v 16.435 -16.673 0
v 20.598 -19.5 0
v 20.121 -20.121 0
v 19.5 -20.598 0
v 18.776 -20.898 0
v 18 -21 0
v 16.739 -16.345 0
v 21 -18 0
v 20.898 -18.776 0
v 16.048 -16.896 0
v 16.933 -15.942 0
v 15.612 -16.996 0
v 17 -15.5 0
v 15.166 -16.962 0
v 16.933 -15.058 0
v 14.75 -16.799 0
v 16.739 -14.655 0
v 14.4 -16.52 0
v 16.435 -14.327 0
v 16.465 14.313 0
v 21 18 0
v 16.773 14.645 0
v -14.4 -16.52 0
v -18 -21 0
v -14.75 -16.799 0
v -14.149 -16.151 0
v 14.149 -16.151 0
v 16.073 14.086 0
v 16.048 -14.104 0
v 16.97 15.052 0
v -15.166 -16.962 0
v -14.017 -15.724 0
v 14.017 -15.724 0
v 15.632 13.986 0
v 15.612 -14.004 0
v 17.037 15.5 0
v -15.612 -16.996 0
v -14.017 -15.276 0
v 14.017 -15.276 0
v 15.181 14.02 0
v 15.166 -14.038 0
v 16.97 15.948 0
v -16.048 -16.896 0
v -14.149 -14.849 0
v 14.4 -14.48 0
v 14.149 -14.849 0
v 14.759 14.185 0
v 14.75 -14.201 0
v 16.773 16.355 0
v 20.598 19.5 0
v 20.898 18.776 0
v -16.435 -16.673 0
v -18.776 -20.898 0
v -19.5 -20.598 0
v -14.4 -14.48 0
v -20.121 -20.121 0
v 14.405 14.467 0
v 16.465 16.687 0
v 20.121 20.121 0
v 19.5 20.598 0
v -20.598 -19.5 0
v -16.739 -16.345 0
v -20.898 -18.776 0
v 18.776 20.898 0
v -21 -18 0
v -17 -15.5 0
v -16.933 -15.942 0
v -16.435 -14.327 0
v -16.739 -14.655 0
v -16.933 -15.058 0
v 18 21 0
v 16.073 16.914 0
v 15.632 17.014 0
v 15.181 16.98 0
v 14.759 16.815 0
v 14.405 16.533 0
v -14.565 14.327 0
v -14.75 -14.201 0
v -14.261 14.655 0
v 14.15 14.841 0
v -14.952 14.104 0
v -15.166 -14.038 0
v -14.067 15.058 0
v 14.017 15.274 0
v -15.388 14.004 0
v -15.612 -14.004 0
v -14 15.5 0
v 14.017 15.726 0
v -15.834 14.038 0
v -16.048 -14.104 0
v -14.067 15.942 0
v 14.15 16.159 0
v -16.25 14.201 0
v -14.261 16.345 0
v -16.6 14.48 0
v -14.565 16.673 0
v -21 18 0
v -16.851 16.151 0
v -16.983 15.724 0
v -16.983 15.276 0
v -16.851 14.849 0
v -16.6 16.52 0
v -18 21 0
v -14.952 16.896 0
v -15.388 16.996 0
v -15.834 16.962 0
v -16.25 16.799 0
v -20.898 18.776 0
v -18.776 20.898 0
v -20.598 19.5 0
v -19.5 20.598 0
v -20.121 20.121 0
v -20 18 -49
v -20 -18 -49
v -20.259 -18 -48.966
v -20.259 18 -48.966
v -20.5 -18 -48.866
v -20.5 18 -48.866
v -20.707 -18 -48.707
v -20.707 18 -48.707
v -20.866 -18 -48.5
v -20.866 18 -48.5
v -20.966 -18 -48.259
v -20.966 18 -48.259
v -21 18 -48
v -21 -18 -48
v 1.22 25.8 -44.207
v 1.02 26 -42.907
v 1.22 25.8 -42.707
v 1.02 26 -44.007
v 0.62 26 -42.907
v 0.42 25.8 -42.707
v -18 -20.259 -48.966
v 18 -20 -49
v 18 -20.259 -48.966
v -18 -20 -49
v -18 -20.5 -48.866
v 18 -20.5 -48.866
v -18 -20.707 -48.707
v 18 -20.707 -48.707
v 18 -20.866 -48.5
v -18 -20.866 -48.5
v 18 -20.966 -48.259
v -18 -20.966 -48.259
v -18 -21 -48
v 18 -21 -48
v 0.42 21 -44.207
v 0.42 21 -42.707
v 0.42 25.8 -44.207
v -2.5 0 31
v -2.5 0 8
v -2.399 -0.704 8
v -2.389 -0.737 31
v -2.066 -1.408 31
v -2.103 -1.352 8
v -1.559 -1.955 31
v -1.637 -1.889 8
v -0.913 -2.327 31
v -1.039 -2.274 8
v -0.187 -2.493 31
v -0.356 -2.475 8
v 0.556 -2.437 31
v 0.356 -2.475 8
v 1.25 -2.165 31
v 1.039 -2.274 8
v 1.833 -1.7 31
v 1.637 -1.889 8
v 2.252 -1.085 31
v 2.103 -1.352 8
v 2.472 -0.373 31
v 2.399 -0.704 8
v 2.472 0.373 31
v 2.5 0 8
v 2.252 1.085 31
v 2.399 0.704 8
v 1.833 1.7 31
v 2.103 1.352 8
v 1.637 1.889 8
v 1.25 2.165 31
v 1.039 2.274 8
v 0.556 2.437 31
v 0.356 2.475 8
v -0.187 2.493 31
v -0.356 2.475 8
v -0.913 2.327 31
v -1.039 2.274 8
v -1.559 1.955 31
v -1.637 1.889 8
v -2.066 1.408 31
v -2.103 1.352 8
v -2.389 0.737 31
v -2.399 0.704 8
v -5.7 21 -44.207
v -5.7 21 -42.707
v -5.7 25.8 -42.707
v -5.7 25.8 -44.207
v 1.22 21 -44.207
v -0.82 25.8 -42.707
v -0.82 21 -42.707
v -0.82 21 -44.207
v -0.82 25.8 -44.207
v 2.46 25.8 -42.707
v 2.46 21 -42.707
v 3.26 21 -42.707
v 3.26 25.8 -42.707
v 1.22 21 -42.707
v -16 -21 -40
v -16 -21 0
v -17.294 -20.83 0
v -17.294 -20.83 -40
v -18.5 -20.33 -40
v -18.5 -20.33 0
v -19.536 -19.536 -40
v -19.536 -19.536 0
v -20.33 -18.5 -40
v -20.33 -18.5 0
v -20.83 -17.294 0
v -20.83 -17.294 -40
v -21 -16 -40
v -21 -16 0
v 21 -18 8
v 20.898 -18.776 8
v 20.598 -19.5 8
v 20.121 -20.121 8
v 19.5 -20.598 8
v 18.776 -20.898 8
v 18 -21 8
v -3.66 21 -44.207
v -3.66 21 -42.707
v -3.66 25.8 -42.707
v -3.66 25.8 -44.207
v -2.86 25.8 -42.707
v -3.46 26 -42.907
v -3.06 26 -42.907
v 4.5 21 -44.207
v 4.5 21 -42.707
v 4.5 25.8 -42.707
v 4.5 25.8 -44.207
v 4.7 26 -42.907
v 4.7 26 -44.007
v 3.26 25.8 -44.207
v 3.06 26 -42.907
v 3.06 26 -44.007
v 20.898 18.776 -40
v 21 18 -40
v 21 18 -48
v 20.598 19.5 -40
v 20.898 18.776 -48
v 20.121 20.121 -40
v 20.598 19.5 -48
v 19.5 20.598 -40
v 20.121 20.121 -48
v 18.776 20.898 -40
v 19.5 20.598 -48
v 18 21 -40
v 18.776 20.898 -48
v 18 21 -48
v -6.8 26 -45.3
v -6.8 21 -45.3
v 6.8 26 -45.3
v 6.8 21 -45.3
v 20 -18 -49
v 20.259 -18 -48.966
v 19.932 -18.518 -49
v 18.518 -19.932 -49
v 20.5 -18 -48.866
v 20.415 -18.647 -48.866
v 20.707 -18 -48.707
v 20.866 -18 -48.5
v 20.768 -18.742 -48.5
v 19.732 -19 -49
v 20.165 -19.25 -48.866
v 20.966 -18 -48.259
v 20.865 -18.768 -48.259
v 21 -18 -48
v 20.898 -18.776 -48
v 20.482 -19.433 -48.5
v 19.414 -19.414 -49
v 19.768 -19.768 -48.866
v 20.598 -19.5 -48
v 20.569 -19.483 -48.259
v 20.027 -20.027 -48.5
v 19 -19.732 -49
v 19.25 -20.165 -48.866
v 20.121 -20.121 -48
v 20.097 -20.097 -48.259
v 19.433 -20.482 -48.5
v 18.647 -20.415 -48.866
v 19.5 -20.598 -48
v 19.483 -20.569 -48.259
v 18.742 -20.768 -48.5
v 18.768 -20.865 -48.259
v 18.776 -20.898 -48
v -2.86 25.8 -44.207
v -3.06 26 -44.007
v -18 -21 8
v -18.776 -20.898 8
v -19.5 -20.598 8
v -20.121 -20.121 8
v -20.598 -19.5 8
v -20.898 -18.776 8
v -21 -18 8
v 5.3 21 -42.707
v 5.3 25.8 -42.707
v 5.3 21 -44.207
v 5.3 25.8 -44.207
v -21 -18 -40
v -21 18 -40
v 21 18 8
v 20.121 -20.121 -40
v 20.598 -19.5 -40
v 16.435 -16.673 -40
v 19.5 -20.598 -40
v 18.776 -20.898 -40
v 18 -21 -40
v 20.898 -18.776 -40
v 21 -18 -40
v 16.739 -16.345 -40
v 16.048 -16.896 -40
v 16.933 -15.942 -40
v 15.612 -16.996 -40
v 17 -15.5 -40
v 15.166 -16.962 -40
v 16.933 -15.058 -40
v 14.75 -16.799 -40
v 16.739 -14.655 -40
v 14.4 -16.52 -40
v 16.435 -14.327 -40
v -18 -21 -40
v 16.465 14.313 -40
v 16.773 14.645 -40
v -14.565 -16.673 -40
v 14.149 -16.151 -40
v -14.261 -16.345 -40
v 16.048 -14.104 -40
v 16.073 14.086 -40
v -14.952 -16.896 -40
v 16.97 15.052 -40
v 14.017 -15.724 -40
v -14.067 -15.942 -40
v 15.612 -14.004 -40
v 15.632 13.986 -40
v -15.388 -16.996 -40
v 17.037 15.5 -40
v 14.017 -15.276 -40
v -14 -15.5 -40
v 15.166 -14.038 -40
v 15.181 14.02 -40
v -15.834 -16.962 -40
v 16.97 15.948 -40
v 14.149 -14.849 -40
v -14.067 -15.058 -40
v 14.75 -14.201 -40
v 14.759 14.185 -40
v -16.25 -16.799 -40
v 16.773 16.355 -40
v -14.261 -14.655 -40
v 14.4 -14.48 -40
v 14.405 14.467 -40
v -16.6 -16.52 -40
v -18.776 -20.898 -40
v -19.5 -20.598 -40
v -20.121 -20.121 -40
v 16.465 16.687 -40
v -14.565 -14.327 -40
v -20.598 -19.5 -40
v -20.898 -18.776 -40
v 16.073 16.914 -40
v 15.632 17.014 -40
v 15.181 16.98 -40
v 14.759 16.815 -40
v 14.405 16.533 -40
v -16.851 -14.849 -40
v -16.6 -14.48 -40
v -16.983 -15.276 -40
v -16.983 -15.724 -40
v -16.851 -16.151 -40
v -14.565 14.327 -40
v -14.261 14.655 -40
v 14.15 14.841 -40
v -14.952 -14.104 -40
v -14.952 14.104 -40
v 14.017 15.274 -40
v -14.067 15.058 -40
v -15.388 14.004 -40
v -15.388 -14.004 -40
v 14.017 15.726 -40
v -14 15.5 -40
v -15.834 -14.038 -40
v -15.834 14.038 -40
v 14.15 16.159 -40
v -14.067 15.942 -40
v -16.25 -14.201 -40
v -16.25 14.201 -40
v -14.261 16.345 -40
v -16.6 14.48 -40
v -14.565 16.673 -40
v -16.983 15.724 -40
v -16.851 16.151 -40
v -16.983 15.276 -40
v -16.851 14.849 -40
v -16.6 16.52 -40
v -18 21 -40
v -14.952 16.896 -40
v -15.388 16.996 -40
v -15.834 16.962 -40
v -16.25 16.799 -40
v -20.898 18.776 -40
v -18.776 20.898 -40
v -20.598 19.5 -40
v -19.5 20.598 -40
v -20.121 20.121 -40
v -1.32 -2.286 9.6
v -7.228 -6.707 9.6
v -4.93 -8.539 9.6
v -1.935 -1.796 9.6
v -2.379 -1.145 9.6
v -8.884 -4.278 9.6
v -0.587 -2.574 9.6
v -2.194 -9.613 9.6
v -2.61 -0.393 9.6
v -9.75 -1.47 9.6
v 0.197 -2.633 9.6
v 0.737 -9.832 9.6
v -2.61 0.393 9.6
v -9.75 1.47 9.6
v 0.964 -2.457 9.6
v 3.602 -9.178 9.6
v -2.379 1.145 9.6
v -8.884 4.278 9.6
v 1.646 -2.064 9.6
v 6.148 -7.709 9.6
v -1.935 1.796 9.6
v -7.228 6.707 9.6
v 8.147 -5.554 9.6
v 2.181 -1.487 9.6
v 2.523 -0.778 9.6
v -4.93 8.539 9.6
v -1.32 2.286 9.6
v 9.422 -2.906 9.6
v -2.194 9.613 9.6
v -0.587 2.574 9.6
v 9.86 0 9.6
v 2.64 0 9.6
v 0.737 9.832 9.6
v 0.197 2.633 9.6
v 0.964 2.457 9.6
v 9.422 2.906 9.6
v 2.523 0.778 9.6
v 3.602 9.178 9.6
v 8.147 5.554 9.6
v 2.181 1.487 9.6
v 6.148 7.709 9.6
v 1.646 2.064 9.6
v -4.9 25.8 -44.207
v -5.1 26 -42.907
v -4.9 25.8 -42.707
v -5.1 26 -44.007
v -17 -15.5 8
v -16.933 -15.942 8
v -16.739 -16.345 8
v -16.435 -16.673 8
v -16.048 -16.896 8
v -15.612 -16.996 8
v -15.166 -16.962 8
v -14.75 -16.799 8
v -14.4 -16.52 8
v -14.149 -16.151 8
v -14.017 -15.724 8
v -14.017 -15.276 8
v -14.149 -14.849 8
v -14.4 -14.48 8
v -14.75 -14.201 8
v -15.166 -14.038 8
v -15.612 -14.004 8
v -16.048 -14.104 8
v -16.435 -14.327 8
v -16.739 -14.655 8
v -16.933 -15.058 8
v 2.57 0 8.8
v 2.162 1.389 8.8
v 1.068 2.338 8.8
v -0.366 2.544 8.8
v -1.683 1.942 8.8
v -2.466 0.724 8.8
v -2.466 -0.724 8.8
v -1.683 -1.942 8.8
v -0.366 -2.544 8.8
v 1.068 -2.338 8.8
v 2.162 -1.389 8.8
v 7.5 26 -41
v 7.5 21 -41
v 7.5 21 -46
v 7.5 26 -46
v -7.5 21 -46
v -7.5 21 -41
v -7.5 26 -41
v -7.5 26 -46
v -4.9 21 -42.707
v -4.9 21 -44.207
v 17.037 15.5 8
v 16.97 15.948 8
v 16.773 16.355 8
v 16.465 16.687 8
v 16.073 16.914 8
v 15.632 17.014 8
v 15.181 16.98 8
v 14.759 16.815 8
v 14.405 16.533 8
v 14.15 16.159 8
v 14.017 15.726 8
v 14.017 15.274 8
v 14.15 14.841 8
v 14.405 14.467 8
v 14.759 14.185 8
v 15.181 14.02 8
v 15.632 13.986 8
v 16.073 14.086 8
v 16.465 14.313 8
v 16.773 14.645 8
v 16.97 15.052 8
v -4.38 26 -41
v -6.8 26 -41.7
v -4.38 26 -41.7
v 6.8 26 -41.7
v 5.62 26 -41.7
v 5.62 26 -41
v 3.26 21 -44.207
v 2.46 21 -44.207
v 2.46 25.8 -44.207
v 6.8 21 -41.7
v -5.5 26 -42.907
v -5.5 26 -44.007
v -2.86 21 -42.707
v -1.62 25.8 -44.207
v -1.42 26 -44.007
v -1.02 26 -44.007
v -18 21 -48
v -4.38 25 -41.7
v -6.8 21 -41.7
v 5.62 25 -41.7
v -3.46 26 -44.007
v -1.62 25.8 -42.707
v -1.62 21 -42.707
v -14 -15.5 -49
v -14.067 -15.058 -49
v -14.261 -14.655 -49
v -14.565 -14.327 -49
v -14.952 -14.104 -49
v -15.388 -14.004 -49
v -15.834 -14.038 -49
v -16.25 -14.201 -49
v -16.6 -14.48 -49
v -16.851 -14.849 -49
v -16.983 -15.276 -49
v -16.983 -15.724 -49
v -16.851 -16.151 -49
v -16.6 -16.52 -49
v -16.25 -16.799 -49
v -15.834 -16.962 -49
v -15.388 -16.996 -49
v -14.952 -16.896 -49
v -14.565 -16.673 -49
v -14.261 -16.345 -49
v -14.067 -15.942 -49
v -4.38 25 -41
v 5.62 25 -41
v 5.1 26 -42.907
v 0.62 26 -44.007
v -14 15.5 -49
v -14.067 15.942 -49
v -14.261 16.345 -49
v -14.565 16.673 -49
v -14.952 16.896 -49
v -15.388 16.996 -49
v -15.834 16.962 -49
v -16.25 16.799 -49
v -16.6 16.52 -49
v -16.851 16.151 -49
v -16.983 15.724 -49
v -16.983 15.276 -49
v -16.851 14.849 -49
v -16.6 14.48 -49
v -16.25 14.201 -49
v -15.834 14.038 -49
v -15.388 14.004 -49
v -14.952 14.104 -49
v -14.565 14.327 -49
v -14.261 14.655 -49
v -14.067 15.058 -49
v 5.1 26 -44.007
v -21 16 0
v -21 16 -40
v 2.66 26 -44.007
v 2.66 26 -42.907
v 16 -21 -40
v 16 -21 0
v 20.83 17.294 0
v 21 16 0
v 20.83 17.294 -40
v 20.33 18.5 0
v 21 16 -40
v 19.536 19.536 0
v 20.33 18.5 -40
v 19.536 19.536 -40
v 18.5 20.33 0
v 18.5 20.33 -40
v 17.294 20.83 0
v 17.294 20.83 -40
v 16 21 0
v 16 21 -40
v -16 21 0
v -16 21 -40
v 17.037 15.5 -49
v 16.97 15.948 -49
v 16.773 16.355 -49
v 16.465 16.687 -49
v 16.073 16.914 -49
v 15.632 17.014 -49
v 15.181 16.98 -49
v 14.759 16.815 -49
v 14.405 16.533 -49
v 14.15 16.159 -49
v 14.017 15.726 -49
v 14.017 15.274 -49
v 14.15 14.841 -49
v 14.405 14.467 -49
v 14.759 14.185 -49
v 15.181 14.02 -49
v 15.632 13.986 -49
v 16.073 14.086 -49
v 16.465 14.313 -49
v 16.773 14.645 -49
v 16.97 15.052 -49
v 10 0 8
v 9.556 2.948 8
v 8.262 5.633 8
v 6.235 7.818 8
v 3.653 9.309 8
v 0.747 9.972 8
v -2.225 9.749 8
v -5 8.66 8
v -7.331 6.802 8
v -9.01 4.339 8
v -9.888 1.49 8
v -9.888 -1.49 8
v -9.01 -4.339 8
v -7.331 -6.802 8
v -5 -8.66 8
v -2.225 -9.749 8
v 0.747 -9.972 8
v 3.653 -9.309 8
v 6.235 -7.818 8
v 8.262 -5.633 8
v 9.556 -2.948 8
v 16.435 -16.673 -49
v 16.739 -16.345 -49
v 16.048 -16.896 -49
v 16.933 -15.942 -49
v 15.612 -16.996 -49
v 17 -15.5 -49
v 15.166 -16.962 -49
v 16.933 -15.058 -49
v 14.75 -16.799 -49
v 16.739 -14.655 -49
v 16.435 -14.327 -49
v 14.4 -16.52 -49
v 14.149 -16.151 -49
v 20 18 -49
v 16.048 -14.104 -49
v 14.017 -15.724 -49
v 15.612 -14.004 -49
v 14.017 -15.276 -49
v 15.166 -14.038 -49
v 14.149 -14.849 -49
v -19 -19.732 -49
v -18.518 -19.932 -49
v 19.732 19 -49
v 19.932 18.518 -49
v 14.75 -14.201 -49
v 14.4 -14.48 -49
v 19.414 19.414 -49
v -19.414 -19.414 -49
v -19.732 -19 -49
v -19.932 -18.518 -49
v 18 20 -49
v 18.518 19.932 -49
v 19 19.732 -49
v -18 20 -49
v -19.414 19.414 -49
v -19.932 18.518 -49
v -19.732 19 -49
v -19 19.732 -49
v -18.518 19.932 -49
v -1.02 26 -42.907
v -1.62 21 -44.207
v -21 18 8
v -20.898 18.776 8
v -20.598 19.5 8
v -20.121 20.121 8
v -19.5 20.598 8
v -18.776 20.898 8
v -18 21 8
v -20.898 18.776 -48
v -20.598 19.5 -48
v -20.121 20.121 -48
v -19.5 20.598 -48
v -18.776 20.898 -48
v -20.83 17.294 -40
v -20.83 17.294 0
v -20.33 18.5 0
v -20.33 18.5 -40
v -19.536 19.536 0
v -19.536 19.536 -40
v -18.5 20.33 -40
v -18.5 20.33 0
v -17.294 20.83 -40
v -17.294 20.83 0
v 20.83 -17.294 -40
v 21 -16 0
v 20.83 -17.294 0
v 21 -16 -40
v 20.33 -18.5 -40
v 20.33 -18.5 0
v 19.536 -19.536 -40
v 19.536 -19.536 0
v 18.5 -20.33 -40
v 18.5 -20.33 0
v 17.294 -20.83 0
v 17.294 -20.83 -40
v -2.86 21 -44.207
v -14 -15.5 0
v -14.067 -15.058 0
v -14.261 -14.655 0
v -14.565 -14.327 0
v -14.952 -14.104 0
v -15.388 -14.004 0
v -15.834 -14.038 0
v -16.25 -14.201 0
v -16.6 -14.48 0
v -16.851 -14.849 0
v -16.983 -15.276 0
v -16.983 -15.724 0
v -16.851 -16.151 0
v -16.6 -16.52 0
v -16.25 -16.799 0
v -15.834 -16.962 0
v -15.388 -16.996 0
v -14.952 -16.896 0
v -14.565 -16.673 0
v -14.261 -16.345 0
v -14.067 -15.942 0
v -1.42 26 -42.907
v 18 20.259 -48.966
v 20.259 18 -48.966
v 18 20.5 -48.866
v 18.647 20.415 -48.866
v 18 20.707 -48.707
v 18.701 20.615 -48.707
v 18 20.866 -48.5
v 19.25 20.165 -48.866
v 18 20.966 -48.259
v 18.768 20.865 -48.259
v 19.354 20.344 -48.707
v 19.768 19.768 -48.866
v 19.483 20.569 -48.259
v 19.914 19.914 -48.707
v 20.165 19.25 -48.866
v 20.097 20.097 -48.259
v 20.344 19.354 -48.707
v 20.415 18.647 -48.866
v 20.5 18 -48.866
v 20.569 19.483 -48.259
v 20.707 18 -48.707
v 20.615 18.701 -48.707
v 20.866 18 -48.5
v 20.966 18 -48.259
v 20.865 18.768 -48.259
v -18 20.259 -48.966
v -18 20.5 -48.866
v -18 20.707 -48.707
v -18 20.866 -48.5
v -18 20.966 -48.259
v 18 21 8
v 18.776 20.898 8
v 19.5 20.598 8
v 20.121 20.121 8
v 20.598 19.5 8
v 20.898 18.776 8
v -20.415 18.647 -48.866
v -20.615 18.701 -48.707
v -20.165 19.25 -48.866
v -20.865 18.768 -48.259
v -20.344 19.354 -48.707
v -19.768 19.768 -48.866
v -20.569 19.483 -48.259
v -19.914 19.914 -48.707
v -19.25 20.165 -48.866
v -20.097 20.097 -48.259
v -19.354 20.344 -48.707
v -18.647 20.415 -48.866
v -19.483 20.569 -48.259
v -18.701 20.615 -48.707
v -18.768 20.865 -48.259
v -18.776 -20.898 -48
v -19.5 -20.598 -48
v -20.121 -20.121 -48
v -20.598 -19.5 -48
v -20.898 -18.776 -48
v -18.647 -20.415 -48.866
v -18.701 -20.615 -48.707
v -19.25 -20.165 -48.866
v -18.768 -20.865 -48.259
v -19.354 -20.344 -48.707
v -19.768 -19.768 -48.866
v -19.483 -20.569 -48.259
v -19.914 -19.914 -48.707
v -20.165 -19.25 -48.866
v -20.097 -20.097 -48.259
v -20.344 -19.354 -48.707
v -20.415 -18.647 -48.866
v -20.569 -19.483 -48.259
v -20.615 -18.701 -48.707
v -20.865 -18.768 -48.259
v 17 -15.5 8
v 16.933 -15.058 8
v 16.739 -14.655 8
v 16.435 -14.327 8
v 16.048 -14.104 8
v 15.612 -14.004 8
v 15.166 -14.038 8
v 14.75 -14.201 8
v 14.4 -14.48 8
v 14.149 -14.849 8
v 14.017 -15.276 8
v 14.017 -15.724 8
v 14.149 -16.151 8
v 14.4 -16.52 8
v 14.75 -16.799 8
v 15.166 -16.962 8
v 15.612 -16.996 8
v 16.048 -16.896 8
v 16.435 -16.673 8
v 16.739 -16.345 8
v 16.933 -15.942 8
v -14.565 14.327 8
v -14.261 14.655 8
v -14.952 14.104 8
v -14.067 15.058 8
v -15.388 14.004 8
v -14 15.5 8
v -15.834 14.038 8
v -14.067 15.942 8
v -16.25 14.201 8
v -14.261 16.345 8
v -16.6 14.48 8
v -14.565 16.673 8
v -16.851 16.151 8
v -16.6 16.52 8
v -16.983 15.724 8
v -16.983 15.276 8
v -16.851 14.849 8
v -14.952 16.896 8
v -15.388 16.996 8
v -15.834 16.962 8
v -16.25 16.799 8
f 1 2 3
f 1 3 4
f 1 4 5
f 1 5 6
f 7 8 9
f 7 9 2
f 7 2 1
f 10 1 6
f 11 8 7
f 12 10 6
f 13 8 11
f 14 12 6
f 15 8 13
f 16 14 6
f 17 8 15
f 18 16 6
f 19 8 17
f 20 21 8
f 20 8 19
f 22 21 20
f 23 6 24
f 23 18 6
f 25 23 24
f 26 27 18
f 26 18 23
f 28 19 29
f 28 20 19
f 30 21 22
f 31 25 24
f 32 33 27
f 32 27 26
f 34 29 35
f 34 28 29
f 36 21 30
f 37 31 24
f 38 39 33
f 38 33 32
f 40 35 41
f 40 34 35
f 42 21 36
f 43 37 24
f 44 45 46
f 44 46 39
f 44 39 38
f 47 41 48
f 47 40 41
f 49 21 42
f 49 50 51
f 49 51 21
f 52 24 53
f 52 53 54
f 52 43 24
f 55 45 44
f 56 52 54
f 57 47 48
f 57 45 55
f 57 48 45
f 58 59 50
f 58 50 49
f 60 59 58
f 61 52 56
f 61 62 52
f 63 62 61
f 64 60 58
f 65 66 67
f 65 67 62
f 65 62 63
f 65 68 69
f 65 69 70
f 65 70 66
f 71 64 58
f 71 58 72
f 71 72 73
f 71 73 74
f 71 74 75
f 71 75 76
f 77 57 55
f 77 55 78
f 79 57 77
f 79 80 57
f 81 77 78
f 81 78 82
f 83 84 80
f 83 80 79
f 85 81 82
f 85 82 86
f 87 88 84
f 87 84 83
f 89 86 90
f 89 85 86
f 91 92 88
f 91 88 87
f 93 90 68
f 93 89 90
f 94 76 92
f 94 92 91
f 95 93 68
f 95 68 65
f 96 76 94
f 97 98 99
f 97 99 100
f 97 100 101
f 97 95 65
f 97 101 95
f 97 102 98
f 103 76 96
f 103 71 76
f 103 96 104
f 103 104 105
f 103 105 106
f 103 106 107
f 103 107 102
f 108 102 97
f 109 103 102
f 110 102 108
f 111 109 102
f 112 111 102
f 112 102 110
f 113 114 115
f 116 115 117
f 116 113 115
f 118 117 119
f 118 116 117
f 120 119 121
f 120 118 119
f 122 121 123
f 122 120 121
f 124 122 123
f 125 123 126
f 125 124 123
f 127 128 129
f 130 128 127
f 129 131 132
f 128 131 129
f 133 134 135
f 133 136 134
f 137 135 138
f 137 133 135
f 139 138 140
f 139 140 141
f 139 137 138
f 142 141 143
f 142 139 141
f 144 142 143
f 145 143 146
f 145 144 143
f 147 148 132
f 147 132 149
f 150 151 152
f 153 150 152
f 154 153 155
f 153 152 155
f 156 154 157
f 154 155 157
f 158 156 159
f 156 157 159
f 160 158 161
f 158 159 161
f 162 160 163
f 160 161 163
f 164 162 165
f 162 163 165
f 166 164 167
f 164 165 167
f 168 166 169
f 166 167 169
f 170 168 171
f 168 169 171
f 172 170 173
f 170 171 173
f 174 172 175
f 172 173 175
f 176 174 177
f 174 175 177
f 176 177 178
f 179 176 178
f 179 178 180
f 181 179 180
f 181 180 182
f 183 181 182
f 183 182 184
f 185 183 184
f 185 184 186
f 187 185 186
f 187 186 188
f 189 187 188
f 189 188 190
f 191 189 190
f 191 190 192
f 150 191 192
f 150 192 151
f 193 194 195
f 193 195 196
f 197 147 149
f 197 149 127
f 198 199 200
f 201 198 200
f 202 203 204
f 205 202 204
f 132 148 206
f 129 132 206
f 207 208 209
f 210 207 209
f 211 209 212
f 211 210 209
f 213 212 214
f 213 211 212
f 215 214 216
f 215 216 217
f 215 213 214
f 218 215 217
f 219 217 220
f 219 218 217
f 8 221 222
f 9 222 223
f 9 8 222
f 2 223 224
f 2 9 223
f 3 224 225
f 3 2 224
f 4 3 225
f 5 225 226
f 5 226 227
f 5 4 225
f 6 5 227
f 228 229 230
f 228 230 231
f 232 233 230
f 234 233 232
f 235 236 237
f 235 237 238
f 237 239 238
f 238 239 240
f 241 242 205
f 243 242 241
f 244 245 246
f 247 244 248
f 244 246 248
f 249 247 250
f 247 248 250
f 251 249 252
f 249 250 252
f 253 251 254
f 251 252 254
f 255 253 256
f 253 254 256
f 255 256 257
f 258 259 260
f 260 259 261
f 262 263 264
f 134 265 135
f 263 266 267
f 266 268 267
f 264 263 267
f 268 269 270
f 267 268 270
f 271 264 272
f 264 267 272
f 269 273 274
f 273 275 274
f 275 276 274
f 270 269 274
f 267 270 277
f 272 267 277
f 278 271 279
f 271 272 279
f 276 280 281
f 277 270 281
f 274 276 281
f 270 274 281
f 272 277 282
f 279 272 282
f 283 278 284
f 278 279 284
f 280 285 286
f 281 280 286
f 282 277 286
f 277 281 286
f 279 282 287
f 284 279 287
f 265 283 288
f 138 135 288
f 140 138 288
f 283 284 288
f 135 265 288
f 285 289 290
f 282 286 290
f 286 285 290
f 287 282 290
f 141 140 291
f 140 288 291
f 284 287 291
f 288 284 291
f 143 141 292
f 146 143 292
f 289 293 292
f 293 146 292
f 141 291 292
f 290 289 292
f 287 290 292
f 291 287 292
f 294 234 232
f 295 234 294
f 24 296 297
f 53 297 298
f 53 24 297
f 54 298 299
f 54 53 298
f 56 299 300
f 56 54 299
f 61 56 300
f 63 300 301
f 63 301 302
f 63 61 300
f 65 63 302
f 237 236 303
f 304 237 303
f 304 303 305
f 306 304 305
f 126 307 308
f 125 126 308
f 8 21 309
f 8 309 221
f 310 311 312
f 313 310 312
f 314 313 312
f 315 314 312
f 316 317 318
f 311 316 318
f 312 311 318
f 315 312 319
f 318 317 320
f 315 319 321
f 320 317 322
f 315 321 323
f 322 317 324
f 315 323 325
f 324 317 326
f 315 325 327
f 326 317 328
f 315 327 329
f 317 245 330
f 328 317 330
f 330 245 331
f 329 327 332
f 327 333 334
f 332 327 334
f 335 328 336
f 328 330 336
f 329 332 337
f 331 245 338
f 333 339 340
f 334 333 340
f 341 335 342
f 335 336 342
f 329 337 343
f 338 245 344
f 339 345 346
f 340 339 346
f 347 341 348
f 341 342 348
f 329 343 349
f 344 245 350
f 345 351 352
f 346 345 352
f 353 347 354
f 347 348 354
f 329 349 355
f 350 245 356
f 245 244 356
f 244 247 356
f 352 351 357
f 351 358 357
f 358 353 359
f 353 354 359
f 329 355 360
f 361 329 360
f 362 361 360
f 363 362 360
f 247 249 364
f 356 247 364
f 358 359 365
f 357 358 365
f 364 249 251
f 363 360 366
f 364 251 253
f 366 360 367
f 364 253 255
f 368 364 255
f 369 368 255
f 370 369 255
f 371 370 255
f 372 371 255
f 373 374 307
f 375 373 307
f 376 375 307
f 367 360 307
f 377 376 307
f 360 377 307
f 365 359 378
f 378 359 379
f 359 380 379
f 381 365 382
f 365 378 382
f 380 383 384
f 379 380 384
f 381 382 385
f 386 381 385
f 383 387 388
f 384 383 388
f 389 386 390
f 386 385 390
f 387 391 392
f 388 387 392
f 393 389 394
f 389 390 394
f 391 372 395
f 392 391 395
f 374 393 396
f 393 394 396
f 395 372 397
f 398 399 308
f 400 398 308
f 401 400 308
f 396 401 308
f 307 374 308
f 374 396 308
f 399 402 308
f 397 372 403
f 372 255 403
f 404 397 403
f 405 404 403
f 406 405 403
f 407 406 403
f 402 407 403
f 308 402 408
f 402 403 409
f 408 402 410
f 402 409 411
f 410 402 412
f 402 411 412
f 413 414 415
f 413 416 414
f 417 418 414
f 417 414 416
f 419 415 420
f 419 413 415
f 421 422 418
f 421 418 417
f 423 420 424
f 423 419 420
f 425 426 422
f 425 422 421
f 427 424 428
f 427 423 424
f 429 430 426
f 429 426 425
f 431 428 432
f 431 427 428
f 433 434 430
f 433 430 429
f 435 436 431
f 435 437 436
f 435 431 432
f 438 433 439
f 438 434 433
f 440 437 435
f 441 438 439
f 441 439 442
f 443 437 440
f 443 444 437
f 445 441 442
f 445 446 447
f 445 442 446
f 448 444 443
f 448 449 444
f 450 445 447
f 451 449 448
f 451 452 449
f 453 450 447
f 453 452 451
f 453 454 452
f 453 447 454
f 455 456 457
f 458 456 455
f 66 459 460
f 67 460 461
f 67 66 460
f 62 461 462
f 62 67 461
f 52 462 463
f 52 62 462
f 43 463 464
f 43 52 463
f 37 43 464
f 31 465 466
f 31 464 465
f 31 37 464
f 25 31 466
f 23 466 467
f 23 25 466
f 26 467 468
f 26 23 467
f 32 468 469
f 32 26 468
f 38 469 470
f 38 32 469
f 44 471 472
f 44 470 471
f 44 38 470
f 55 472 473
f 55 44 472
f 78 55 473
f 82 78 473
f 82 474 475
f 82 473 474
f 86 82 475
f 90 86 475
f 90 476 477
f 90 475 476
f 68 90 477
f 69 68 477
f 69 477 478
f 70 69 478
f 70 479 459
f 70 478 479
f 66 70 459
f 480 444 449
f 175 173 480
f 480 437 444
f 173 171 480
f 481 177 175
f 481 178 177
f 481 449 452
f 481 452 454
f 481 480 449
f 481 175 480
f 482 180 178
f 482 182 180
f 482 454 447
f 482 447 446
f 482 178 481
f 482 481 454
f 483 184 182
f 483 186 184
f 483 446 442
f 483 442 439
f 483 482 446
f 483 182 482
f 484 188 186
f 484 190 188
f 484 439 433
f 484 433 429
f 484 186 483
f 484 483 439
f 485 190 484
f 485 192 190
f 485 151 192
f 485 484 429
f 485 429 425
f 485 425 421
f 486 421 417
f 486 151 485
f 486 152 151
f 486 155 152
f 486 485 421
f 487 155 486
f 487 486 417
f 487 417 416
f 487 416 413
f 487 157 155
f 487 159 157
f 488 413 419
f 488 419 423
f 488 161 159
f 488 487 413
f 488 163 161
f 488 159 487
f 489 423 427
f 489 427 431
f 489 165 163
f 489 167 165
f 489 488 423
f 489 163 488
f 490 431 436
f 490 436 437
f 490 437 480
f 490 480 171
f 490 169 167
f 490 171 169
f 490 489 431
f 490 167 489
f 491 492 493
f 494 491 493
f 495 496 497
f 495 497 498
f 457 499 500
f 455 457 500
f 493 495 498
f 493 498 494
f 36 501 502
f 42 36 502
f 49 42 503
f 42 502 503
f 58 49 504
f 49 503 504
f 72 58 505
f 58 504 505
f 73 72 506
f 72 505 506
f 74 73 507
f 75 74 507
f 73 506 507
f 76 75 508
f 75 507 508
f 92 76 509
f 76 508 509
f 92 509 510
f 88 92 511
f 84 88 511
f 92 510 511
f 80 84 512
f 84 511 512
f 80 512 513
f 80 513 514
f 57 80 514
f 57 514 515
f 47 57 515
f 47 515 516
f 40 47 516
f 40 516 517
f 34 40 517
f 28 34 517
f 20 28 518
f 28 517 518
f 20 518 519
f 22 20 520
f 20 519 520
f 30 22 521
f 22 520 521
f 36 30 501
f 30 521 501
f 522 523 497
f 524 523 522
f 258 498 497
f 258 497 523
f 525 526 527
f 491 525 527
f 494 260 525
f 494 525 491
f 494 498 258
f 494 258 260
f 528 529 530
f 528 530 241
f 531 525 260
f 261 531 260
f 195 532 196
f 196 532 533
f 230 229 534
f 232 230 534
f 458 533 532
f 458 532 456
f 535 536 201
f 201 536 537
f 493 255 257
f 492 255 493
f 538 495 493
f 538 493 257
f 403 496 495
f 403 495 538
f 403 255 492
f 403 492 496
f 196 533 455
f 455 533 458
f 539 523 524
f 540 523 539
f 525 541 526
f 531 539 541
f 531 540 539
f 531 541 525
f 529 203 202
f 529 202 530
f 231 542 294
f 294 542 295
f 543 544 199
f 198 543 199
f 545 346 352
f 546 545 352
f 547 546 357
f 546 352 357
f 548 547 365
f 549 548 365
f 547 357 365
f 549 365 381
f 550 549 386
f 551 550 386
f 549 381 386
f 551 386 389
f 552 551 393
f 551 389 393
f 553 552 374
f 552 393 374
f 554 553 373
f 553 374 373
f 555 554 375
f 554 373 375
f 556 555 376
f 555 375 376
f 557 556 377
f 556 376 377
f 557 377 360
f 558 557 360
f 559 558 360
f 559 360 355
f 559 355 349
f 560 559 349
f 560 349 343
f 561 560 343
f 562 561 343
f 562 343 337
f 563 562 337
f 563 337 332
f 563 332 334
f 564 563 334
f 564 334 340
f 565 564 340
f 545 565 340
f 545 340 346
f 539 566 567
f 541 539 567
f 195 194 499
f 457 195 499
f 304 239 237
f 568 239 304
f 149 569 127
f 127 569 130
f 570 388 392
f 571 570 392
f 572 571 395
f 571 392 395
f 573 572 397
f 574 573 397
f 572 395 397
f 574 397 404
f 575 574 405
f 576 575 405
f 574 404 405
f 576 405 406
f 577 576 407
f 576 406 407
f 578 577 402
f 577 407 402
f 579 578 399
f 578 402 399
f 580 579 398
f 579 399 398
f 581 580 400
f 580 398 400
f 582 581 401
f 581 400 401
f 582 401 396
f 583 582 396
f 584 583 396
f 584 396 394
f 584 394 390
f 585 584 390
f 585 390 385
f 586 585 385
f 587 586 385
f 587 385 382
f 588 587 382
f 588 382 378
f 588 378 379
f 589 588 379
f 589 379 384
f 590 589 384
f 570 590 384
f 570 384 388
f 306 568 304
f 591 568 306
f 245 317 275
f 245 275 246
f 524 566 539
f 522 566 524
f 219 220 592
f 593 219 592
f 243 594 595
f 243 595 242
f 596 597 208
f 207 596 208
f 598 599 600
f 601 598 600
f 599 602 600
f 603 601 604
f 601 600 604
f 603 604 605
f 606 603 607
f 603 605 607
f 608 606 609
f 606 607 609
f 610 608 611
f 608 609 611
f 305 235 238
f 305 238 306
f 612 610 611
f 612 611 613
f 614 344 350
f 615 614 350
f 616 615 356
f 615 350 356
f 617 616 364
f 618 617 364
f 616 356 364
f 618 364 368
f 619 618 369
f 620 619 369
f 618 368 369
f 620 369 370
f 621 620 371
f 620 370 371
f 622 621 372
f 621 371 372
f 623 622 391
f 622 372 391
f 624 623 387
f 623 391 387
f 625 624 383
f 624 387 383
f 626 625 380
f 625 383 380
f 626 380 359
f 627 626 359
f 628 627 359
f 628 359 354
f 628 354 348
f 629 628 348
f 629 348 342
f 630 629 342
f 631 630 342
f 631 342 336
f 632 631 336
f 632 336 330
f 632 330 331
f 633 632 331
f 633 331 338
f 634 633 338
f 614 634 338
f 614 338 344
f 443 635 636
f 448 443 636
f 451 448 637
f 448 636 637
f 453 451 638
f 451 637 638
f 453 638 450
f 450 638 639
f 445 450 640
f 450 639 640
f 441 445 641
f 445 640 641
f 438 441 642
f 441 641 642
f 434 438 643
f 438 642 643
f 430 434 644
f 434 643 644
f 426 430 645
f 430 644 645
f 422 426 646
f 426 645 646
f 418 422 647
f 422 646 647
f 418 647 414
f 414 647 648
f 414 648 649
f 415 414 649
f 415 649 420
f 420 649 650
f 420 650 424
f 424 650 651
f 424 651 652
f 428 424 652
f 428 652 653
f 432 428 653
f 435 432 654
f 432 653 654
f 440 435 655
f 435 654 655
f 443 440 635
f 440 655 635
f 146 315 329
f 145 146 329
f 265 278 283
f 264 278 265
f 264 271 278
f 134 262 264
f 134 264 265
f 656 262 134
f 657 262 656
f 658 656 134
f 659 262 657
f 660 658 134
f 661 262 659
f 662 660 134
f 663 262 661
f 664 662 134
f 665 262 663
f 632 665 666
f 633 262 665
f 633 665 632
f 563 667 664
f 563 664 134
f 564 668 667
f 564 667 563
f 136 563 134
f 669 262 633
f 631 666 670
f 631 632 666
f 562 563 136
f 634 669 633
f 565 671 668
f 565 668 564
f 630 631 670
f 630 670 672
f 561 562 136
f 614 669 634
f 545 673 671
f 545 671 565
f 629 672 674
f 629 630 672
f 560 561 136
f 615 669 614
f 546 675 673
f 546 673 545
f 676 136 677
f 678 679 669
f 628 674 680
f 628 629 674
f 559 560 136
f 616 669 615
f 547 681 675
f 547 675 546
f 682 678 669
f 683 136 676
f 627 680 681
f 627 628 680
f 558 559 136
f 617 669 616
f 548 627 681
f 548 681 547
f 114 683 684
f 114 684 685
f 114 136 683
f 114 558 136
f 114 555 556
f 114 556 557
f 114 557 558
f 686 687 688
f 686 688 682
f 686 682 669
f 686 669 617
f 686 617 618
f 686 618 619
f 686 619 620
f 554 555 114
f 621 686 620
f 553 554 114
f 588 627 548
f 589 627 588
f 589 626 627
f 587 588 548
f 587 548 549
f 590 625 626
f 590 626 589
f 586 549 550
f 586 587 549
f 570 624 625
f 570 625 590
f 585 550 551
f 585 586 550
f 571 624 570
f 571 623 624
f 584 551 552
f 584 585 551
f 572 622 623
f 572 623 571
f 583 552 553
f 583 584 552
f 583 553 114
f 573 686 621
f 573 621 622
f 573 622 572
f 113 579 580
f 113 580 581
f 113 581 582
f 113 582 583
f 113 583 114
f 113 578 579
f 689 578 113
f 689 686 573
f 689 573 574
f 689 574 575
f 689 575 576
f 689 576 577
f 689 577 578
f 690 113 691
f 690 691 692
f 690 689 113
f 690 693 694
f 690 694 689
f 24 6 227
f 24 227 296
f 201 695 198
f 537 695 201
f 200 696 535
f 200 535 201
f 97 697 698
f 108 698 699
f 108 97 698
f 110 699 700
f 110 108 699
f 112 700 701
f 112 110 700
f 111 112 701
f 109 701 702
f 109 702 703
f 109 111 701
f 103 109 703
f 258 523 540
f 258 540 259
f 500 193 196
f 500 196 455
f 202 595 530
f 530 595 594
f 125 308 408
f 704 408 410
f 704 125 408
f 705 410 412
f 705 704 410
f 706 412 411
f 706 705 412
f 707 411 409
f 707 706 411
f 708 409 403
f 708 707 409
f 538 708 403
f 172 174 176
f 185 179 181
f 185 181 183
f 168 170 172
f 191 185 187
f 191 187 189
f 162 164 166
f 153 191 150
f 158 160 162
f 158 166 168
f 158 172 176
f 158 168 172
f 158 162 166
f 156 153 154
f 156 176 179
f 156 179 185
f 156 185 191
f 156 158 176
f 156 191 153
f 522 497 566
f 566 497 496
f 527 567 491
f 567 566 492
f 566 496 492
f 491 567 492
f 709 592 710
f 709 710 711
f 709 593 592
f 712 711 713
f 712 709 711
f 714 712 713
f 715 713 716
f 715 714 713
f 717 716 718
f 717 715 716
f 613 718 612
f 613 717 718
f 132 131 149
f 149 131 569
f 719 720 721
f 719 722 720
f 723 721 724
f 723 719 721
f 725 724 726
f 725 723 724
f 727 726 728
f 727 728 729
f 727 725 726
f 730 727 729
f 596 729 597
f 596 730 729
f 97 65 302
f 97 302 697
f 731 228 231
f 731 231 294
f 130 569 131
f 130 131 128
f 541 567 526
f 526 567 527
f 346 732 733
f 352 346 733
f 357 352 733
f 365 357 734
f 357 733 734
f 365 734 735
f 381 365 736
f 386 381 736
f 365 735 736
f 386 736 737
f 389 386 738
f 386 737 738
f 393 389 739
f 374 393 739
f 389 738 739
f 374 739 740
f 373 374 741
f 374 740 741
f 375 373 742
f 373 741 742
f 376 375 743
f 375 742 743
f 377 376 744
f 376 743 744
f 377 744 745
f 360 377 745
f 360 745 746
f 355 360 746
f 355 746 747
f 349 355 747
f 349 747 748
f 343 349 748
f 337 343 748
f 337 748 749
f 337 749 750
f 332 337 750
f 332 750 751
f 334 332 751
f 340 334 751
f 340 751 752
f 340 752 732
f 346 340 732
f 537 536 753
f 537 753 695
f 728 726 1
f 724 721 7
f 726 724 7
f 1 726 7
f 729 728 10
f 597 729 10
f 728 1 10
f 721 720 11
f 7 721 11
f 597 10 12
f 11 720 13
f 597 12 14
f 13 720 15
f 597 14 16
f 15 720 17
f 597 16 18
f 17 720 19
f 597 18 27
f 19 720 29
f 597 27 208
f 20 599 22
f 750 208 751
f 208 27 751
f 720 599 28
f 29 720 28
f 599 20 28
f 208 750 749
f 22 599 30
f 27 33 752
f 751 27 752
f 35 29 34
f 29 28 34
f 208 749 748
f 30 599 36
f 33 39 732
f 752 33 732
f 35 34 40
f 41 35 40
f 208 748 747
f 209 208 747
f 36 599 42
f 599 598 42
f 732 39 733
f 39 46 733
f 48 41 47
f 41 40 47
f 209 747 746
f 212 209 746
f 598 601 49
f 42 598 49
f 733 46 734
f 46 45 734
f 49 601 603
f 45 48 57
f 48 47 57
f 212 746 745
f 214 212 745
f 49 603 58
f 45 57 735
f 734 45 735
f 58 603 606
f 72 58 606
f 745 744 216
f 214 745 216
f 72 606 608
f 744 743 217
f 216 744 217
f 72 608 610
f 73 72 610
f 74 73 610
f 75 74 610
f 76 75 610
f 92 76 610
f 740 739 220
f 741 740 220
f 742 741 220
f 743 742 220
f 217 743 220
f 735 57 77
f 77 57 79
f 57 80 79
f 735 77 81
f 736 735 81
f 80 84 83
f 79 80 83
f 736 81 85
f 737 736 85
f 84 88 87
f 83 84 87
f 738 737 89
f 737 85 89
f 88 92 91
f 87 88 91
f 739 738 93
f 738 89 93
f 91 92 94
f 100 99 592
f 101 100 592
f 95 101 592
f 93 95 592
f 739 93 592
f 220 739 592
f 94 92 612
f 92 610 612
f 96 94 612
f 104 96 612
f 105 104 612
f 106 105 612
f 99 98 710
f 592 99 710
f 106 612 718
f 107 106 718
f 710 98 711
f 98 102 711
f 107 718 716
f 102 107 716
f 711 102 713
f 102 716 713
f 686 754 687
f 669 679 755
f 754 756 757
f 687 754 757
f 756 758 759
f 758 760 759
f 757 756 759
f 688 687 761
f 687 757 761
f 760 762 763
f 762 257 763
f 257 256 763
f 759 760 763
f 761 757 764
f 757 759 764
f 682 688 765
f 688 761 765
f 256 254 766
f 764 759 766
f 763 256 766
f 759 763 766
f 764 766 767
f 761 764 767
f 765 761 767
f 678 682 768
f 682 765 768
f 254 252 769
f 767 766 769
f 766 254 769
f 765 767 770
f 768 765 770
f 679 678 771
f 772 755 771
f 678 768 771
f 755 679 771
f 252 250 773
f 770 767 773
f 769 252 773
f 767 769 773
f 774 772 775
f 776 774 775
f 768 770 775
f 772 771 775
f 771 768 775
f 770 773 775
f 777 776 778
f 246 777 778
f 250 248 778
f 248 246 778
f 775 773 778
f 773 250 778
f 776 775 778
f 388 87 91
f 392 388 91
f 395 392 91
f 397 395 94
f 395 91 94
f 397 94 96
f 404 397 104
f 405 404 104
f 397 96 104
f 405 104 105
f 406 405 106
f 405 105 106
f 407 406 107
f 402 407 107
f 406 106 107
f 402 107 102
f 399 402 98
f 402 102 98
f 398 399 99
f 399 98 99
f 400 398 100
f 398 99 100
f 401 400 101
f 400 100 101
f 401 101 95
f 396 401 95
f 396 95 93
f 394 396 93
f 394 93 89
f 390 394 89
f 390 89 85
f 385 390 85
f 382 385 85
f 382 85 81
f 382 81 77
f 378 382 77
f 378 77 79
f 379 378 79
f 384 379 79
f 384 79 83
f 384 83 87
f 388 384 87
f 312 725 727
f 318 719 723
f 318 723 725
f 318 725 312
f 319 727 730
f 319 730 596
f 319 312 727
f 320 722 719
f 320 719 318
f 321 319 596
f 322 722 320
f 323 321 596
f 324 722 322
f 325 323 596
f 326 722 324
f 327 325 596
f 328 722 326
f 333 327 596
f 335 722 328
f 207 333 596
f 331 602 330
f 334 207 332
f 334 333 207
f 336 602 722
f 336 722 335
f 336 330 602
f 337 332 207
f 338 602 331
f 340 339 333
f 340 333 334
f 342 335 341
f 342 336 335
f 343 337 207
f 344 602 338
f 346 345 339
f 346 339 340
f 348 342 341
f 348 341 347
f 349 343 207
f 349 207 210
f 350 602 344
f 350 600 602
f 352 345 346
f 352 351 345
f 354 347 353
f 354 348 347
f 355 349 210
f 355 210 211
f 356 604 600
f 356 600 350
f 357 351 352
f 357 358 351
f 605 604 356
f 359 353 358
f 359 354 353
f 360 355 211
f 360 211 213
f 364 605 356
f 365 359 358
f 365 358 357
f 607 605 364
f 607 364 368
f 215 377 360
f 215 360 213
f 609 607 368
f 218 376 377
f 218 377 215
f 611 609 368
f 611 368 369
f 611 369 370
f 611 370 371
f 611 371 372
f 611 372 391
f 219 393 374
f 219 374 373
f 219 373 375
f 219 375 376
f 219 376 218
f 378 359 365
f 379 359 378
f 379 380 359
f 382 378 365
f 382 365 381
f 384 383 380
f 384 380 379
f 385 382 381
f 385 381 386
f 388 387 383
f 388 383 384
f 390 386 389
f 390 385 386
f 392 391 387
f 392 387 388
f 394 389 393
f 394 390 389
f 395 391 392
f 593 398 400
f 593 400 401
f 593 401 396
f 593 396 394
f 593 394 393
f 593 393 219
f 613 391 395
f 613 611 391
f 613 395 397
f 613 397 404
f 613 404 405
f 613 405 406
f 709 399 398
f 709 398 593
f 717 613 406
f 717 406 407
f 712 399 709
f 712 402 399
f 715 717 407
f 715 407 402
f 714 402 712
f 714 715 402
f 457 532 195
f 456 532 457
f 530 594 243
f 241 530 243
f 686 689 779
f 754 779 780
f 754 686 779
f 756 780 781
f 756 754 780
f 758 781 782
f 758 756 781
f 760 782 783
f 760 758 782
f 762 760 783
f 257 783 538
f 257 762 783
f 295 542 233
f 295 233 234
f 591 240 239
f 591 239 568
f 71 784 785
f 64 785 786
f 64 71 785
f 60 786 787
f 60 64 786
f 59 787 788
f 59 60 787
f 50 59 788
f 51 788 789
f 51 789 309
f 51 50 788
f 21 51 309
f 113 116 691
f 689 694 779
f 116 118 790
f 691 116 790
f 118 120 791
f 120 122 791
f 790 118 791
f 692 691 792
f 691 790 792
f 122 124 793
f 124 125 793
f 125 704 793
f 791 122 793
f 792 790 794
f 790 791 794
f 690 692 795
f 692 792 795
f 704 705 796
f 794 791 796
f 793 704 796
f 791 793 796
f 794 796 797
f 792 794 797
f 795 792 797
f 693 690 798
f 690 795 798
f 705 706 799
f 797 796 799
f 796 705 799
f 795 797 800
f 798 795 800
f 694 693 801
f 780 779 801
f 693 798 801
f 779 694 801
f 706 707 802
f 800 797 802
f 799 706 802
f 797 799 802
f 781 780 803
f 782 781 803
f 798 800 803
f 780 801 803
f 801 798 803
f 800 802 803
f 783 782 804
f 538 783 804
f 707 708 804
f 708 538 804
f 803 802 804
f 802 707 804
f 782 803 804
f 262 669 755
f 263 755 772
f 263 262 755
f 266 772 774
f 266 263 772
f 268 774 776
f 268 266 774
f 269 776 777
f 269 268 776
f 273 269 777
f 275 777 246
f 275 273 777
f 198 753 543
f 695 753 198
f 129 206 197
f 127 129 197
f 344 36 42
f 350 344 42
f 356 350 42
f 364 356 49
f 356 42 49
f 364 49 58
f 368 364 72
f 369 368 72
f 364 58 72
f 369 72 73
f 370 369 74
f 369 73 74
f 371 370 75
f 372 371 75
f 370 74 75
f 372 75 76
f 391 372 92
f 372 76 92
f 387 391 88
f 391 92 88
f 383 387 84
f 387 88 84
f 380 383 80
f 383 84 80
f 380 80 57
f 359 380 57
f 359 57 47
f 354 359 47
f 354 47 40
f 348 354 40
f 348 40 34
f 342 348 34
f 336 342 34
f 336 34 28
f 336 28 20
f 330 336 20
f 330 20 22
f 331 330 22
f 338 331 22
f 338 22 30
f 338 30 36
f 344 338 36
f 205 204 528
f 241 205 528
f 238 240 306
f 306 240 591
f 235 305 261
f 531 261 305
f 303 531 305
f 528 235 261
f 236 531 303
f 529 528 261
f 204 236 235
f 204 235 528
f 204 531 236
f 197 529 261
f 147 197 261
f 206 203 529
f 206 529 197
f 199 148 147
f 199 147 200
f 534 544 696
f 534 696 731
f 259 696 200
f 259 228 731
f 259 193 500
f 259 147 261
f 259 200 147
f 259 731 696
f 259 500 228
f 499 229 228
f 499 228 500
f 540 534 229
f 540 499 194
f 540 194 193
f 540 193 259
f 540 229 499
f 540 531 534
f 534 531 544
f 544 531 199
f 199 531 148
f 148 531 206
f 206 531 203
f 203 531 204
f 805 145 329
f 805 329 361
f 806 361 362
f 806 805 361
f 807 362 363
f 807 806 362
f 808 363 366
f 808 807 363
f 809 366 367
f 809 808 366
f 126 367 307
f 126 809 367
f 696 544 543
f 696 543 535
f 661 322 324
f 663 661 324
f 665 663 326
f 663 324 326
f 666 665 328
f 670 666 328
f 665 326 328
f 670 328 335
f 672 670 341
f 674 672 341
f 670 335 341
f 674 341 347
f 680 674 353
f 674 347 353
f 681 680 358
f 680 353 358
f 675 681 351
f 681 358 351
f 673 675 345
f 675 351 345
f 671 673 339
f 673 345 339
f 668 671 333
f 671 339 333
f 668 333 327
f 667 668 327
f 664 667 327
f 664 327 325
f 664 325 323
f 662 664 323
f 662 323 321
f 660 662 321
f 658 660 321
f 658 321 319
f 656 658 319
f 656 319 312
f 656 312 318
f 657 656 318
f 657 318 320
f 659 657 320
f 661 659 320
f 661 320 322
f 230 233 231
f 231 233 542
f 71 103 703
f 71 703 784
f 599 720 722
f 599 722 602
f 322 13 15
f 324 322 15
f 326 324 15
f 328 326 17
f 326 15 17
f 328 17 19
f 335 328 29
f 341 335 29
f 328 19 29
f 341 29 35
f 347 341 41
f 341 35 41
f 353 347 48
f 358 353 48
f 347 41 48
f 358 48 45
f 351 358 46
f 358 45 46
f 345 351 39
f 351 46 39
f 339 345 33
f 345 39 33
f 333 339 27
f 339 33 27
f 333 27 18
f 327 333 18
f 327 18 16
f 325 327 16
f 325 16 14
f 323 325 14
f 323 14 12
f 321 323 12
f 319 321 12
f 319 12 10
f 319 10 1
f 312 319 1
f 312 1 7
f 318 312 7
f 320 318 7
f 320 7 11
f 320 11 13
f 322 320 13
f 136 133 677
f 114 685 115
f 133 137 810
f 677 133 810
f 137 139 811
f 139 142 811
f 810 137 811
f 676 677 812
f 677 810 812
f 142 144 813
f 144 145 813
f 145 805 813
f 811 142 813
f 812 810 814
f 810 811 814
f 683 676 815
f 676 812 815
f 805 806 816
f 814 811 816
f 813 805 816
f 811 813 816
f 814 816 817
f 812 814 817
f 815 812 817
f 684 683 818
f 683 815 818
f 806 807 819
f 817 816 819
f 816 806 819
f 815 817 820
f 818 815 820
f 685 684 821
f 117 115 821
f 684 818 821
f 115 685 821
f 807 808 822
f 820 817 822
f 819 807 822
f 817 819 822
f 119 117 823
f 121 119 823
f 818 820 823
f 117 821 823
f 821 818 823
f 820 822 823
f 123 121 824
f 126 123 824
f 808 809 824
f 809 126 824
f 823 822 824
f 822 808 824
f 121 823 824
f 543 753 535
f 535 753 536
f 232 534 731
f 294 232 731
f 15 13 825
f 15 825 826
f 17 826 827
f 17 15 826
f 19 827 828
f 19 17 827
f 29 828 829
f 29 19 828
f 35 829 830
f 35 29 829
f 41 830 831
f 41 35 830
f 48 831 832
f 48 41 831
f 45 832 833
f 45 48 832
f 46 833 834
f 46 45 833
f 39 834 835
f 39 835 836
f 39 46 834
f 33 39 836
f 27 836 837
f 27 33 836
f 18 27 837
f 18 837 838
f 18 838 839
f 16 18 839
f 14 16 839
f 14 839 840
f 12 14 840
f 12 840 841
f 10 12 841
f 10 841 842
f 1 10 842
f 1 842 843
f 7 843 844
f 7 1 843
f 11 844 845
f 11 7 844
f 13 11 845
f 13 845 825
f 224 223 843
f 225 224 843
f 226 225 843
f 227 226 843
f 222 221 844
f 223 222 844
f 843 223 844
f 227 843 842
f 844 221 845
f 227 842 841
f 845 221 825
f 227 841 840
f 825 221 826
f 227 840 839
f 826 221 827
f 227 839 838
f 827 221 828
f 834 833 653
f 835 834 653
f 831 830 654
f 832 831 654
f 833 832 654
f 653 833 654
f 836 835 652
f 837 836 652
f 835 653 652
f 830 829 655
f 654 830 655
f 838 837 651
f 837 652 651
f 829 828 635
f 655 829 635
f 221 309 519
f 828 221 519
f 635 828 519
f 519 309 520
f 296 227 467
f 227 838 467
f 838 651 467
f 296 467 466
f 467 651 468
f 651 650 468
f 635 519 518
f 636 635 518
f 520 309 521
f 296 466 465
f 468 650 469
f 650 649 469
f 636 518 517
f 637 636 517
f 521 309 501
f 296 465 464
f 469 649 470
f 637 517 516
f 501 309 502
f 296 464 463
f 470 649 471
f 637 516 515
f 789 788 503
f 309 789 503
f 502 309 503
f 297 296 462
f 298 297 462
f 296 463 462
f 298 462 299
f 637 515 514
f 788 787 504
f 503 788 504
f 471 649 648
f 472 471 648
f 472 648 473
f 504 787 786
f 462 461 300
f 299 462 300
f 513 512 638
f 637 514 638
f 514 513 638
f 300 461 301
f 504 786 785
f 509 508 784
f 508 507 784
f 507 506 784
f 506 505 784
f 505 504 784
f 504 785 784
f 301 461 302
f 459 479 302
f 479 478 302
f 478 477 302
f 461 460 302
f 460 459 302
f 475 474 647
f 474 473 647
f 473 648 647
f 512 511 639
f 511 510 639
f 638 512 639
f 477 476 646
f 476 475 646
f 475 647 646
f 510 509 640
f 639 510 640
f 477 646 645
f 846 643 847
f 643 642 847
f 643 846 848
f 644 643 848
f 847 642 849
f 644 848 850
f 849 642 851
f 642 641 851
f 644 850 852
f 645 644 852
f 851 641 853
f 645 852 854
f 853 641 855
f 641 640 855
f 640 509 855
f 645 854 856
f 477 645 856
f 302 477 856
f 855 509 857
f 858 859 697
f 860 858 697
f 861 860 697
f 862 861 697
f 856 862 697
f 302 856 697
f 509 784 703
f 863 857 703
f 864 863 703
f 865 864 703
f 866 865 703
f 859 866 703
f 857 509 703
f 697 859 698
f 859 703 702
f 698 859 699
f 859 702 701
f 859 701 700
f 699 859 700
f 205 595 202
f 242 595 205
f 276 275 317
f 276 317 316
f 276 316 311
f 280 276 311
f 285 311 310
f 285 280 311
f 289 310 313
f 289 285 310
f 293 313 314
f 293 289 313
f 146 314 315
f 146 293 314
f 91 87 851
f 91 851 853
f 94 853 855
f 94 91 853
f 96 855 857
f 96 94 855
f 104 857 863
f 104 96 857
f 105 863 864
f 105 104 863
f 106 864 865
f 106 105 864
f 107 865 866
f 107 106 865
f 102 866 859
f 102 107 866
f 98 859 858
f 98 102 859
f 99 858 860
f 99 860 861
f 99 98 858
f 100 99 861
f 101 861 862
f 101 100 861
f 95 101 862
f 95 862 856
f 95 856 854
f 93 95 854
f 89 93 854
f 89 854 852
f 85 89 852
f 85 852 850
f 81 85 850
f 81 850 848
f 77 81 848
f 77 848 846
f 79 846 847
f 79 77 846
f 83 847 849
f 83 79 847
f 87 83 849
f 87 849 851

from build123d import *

# Parameters (mm, degrees)
SKETCH_1_R          = 1.5
EXTRUDE_1_DEPTH     = 8
SKETCH_4_R          = 2.5
EXTRUDE_2_DEPTH     = 23
SKETCH_9_W          = 42
SKETCH_9_H          = 42
EXTRUDE_7_DEPTH     = 40
SKETCH_10_W         = 42
SKETCH_10_H         = 42
EXTRUDE_8_DEPTH     = 9
FILLET_1_R          = 3
FILLET_2_R          = 5
SKETCH_12_R         = 1.5
SKETCH_12_R_2       = 1.518540069
CUT_EXTRUDE_1_DEPTH = 65.272855857
SKETCH_14_W         = 15
SKETCH_14_H         = 5
SKETCH_14_W_2       = 13.6
SKETCH_14_H_2       = 3.6
SKETCH_14_W_3       = 0.8
SKETCH_14_H_3       = 1.5
EXTRUDE_10_DEPTH    = 5
CHAMFER_1_SIZE      = 0.2
SKETCH_15_W         = 10
SKETCH_15_H         = 1
CUT_EXTRUDE_2_DEPTH = 0.7
FILLET_3_R          = 1
SKETCH_16_R         = 10
SKETCH_16_R_2       = 2.5
EXTRUDE_11_DEPTH    = 1.6
EXTRUDE_11_DRAFT    = 5


with BuildPart() as part:
    # 草图1 → 凸台-拉伸1 (new body)
    with BuildSketch(Plane.XY):
        with BuildLine():
            Line((-18, 21), (18, 21))
            ThreePointArc((18, 21), (20.121320344, 20.121320344), (21, 18))
            Line((21, 18), (21, -18))
            ThreePointArc((21, -18), (20.121320344, -20.121320344), (18, -21))
            Line((18, -21), (-18, -21))
            ThreePointArc((-18, -21), (-20.121320344, -20.121320344), (-21, -18))
            Line((-21, -18), (-21, 18))
            ThreePointArc((-21, 18), (-20.121320344, 20.121320344), (-18, 21))
        make_face()
        with Locations((-15.5, 15.5)):
            Circle(SKETCH_1_R, mode=Mode.SUBTRACT)
        with Locations(Location((15.5, 15.5, 0), (0, 0, 180))):
            Circle(SKETCH_1_R, mode=Mode.SUBTRACT)
        with Locations((15.5, -15.5)):
            Circle(SKETCH_1_R, mode=Mode.SUBTRACT)
        with Locations(Location((-15.5, -15.5, 0), (0, 0, 180))):
            Circle(SKETCH_1_R, mode=Mode.SUBTRACT)
    extrude(amount=EXTRUDE_1_DEPTH)

    # 草图4 → 凸台-拉伸2 (add)
    with BuildSketch(Plane.XY.offset(8)):
        with Locations(Location((0, 0, 0), (0, 0, 180))):
            Circle(SKETCH_4_R)
    extrude(amount=EXTRUDE_2_DEPTH)


with BuildPart() as body_2:
    # 草图9 → 凸台-拉伸7 (new body)
    with BuildSketch(Plane(origin=(0, 0, 0), x_dir=(-1, 0, 0), z_dir=(0, 0, -1))):
        Rectangle(SKETCH_9_W, SKETCH_9_H)
    extrude(amount=EXTRUDE_7_DEPTH)

    # 圆角2
    fillet_2_edges = [body_2.edges().sort_by_distance(p)[0] for p in [
        (-21, -21, -20),
        (21, -21, -20),
        (21, 21, -20),
        (-21, 21, -20),
    ]]
    fillet(fillet_2_edges, radius=FILLET_2_R)


with BuildPart() as body_3:
    # 草图10 → 凸台-拉伸8 (new body)
    with BuildSketch(Plane(origin=(0, 0, -40), x_dir=(-1, 0, 0), z_dir=(0, 0, -1))):
        Rectangle(SKETCH_10_W, SKETCH_10_H)
    extrude(amount=EXTRUDE_8_DEPTH)

    # 圆角1
    fillet_1_edges = [body_3.edges().sort_by_distance(p)[0] for p in [
        (21, 21, -44.5),
        (-21, 21, -44.5),
        (-21, -21, -44.5),
        (21, -21, -44.5),
    ]]
    fillet(fillet_1_edges, radius=FILLET_1_R)


with BuildPart() as cut_extrude_1_tool:
    # 草图12 → 切除-拉伸1 (new, through all)
    with BuildSketch(Plane.XY.offset(8)):
        with Locations((-15.5, 15.5)):
            Circle(SKETCH_12_R)
        with Locations((15.518540069, 15.5)):
            Circle(SKETCH_12_R_2)
        with Locations((-15.5, -15.5)):
            Circle(SKETCH_12_R)
        with Locations((15.5, -15.5)):
            Circle(SKETCH_12_R)
    extrude(amount=-CUT_EXTRUDE_1_DEPTH)


with BuildPart() as part_1:
    add(part.part)

    # 切除-拉伸1: cut by cut_extrude_1_tool
    add(cut_extrude_1_tool.part, mode=Mode.SUBTRACT)


with BuildPart() as body_2_1:
    add(body_2.part)

    # 切除-拉伸1: cut by cut_extrude_1_tool
    add(cut_extrude_1_tool.part, mode=Mode.SUBTRACT)


with BuildPart() as body_3_1:
    add(body_3.part)

    # 切除-拉伸1: cut by cut_extrude_1_tool
    add(cut_extrude_1_tool.part, mode=Mode.SUBTRACT)

    # 草图14 → 凸台-拉伸10 (add)
    # profile 1 of 7: a face of its own
    with BuildSketch(Plane(origin=(0, 21, 0), x_dir=(1, 0, 0), z_dir=(0, 1, 0))):
        with Locations((0, 43.5)):
            Rectangle(SKETCH_14_W, SKETCH_14_H)
        with Locations((0, 43.5)):
            Rectangle(SKETCH_14_W_2, SKETCH_14_H_2, mode=Mode.SUBTRACT)
    # profile 2 of 7: a face of its own
    with BuildSketch(Plane(origin=(0, 21, 0), x_dir=(1, 0, 0), z_dir=(0, 1, 0))):
        with Locations((-5.3, 43.457329348)):
            Rectangle(SKETCH_14_W_3, SKETCH_14_H_3)
    # profile 3 of 7: a face of its own
    with BuildSketch(Plane(origin=(0, 21, 0), x_dir=(1, 0, 0), z_dir=(0, 1, 0))):
        with Locations((-1.22, 43.457329348)):
            Rectangle(SKETCH_14_W_3, SKETCH_14_H_3)
    # profile 4 of 7: a face of its own
    with BuildSketch(Plane(origin=(0, 21, 0), x_dir=(1, 0, 0), z_dir=(0, 1, 0))):
        with Locations((4.9, 43.457329348)):
            Rectangle(SKETCH_14_W_3, SKETCH_14_H_3)
    # profile 5 of 7: a face of its own
    with BuildSketch(Plane(origin=(0, 21, 0), x_dir=(1, 0, 0), z_dir=(0, 1, 0))):
        with Locations((2.86, 43.457329348)):
            Rectangle(SKETCH_14_W_3, SKETCH_14_H_3)
    # profile 6 of 7: a face of its own
    with BuildSketch(Plane(origin=(0, 21, 0), x_dir=(1, 0, 0), z_dir=(0, 1, 0))):
        with Locations((-3.26, 43.457329348)):
            Rectangle(SKETCH_14_W_3, SKETCH_14_H_3)
    # profile 7 of 7: a face of its own
    with BuildSketch(Plane(origin=(0, 21, 0), x_dir=(1, 0, 0), z_dir=(0, 1, 0))):
        with Locations((0.82, 43.457329348)):
            Rectangle(SKETCH_14_W_3, SKETCH_14_H_3)
    extrude(amount=EXTRUDE_10_DEPTH)

    # 倒角1
    chamfer_1_edges = [body_3_1.edges().sort_by_distance(p)[0] for p in [
        (5.3, 26, -43.457329348),
        (4.9, 26, -44.207329348),
        (4.5, 26, -43.457329348),
        (4.9, 26, -42.707329348),
        (3.26, 26, -43.457329348),
        (2.86, 26, -44.207329348),
        (2.46, 26, -43.457329348),
        (2.86, 26, -42.707329348),
        (-2.86, 26, -43.457329348),
        (-3.26, 26, -44.207329348),
        (-3.66, 26, -43.457329348),
        (-3.26, 26, -42.707329348),
        (1.22, 26, -43.457329348),
        (0.82, 26, -44.207329348),
        (0.42, 26, -43.457329348),
        (0.82, 26, -42.707329348),
        (-4.9, 26, -43.457329348),
        (-5.3, 26, -44.207329348),
        (-5.7, 26, -43.457329348),
        (-5.3, 26, -42.707329348),
        (-0.82, 26, -43.457329348),
        (-1.22, 26, -44.207329348),
        (-1.62, 26, -43.457329348),
        (-1.22, 26, -42.707329348),
    ]]
    chamfer(chamfer_1_edges, length=CHAMFER_1_SIZE)

    # 草图15 → 切除-拉伸2 (cut)
    with BuildSketch(Plane.XY.offset(-41)):
        with Locations((0.62, 25.5)):
            Rectangle(SKETCH_15_W, SKETCH_15_H)
    extrude(amount=-CUT_EXTRUDE_2_DEPTH, mode=Mode.SUBTRACT)

    # 圆角3
    fillet_3_edges = [body_3_1.edges().sort_by_distance(p)[0] for p in [
        (0, -21, -49),
        (21, 0, -49),
        (-21, 0, -49),
        (0, 21, -49),
        (20.121320344, 20.121320344, -49),
        (-20.121320344, 20.121320344, -49),
        (-20.121320344, -20.121320344, -49),
        (20.121320344, -20.121320344, -49),
    ]]
    fillet(fillet_3_edges, radius=FILLET_3_R)


with BuildPart() as extrude_11_tool:
    # 草图16 → 凸台-拉伸11 (with draft: the straight prism first)
    with BuildSketch(Plane.XY.offset(8)):
        Circle(SKETCH_16_R)
        Circle(SKETCH_16_R_2, mode=Mode.SUBTRACT)
    extrude(amount=EXTRUDE_11_DEPTH)
    # 凸台-拉伸11: the draft: its side faces are tilted about the plane it starts from
    extrude_11_sides = [extrude_11_tool.faces().sort_by_distance(p)[0] for p in [
        (-10, 0, 8.8),
        (-2.5, 0, 8.8),
    ]]
    draft(extrude_11_sides, Plane.XY.offset(8), EXTRUDE_11_DRAFT)


with BuildPart() as part_2:
    add(part_1.part)

    # 凸台-拉伸11: add extrude_11_tool
    add(extrude_11_tool.part)


solid = Compound([body_2_1.part, body_3_1.part, part_2.part])
